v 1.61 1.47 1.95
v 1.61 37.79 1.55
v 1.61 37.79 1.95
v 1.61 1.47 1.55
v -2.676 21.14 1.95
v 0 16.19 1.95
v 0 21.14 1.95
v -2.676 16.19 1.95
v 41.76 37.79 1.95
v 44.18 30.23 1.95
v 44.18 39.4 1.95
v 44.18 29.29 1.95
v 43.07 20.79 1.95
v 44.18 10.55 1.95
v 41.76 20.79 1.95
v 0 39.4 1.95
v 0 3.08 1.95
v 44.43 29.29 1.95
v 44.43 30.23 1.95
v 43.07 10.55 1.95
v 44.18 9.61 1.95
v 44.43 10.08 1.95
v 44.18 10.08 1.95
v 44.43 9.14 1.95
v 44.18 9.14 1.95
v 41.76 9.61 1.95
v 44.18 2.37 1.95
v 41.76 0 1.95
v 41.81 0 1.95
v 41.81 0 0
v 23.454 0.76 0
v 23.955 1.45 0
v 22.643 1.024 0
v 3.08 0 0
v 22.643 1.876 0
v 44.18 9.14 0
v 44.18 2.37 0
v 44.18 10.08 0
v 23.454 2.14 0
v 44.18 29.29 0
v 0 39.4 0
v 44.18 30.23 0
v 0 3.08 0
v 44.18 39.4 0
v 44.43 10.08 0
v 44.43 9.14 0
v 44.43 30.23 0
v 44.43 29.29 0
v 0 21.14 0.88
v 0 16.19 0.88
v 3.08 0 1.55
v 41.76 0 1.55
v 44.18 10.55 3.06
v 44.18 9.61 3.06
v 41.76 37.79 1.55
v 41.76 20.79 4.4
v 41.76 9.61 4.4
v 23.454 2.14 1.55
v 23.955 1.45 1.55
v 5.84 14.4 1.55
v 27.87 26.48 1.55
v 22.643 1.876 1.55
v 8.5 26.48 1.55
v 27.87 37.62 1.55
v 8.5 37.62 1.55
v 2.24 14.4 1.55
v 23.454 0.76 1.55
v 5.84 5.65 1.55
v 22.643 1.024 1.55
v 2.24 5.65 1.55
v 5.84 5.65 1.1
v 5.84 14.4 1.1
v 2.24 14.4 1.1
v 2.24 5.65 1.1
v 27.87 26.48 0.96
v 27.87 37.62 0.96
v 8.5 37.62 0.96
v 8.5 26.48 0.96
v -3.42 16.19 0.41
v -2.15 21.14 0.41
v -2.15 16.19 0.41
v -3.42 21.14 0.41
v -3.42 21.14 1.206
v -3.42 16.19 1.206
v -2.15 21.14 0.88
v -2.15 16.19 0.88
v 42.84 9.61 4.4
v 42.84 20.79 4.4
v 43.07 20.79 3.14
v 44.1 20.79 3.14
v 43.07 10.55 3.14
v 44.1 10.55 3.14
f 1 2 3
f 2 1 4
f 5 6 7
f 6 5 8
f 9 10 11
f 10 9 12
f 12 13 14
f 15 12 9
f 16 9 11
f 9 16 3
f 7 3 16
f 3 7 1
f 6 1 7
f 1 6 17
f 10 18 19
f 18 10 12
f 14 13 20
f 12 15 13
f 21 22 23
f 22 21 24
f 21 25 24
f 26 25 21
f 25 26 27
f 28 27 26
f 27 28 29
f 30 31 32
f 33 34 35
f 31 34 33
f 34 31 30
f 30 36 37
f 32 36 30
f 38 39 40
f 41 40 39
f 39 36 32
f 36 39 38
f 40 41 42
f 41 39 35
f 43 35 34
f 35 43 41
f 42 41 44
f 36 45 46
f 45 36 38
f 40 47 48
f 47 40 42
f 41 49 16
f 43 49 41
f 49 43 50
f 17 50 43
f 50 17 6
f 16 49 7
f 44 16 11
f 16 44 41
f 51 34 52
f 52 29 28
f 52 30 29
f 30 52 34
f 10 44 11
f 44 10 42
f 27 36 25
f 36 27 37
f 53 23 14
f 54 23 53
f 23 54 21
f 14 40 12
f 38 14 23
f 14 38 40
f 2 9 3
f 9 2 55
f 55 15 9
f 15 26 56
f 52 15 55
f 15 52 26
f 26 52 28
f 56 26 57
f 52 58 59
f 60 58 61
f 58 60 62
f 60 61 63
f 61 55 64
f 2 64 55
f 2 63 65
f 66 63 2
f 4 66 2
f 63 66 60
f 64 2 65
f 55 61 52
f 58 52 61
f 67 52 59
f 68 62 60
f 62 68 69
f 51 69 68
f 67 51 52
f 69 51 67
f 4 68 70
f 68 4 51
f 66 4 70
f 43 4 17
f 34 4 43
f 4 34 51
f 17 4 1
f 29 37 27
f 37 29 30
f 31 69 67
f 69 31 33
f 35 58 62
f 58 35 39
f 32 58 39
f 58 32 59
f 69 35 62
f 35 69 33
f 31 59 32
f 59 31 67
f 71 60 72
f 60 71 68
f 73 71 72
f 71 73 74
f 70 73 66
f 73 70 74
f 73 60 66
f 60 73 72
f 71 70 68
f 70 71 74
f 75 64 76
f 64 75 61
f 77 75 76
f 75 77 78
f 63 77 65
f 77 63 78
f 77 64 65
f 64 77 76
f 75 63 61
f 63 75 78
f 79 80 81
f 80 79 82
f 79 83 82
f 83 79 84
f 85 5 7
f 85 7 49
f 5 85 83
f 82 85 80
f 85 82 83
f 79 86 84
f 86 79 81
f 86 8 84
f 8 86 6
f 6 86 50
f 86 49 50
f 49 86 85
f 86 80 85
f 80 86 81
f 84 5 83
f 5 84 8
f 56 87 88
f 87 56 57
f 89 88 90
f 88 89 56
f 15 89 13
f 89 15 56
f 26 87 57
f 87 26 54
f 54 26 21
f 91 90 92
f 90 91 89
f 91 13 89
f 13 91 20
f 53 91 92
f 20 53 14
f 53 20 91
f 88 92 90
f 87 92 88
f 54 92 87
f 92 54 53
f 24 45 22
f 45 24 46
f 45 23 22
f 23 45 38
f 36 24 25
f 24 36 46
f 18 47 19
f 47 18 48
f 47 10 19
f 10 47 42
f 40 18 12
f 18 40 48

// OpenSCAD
// Print Thin Walls
// Initial Layer Speed: 10 mm/s
// draft Quality (fine is too short)
// Top/Bottom Pattern: Concentric (Lines would break riser????)
// Print Supports (clear notches with straight pin)

widen = .5;

width=43.68 + widen;
depth=39.4;
thick=1.55;
dub_thick=2.62;

ridge_thick = 1.95;
ridge_span = 1.61;
ridge_dub_span = 2.42;
shave = 3.1;
shave2 = 2.39;

tab_displace = 16.19;
tab_width = 4.95;
tab_height = 3.42;
tab_thick = 1.54;

tab_divot = 2.15;
tab_divot_thin = 1.07 -.6; // thickness is wrong w/o adjustment

nubbin = .94;
nub_wid = 43.93 - width + widen;
nub_disp1 = 9.14;
nub_disp2 = 29.29;

riser_thick = 4.40;
riser_disp = nub_disp1+nubbin/2;
riser_width = 11.18;
riser_span = ridge_dub_span;

riser_divot = 1.11;
riser_divot_thin = 1.19;
riser_divot_wall = 0.94;

pinhole_x = 23.23;
pinhole_y = 1.45;
pinhole_r = 1.45/2;

inset_x = 2.24;
inset_y = 5.65;
inset_len = 8.75;
inset_wid = 3.60;
inset_dep = 0.45;

shallow_x = 8.5;
shallow_y = 26.48;
shallow_len = 19.37;
shallow_wid = 11.14;
shallow_dep = 0.59;

union() {

// Main Plate
difference() {
    union() {
        cube([width, depth, thick]);
        color([1,0,0]) union() {
            cube([ridge_span, depth, ridge_thick]);
            translate([0,depth-ridge_span,0]) cube([width, ridge_span, ridge_thick]);
            translate([width-ridge_dub_span,0,0]) cube([ridge_dub_span, depth, ridge_thick]);


        }
    }

    translate([0-.01,shave-.01,0]) rotate([0,0,-90]) triangle(shave,shave,10);
    translate([width-shave2+.01,0-.01,0]) rotate([0,0,0]) triangle(shave2,shave2,10);
    
    
    translate([pinhole_x,pinhole_y,0]) cylinder(thick*2,r1=pinhole_r,r2=pinhole_r,center=true);
    color([0,0,.5]) translate([inset_x,inset_y,thick-inset_dep]) cube([inset_wid,inset_len,inset_dep*2]);
    color([0,0,.5]) translate([shallow_x,shallow_y,thick-shallow_dep]) cube([shallow_len,shallow_wid,shallow_dep*2]);
}



// tab
difference() {
    color([0,1,0]) translate([-tab_height,tab_displace,ridge_thick-tab_thick]) cube([tab_height,tab_width,tab_thick]);
    color([.5,0,1]) translate([-tab_divot,tab_displace,ridge_thick-tab_thick]) cube([tab_divot,tab_width,tab_divot_thin]);
    color([0,.5,1]) translate([-tab_height-tab_width*1.05,tab_displace,ridge_thick-tab_thick+tab_width*1.05/2]) rotate([0,45,0]) cube(tab_width);
}

// nubbins
translate([width,nub_disp1,0]) cube([nub_wid,nubbin,ridge_thick]);
translate([width,nub_disp2,0]) cube([nub_wid,nubbin,ridge_thick]);

// riser
difference() {
    color([0,1,0]) translate([width-riser_span,riser_disp,0]) cube([riser_span,riser_width,riser_thick]);
    color([.5,0,1]) translate([width-riser_divot,riser_disp+riser_divot_wall,ridge_thick]) cube([riser_divot,riser_width,riser_divot_thin]);
    color([0,.5,0]) translate([width,riser_disp,ridge_thick+riser_divot]) rotate([0,-45,0]) cube([2,riser_width,2]);
}
}



module triangle(w,h,d){
    difference(){
        cube([w,h,d]);
        rotate([0,0,45]) cube([w+h+d,w+h+d,w+h+d]);
    }
}
